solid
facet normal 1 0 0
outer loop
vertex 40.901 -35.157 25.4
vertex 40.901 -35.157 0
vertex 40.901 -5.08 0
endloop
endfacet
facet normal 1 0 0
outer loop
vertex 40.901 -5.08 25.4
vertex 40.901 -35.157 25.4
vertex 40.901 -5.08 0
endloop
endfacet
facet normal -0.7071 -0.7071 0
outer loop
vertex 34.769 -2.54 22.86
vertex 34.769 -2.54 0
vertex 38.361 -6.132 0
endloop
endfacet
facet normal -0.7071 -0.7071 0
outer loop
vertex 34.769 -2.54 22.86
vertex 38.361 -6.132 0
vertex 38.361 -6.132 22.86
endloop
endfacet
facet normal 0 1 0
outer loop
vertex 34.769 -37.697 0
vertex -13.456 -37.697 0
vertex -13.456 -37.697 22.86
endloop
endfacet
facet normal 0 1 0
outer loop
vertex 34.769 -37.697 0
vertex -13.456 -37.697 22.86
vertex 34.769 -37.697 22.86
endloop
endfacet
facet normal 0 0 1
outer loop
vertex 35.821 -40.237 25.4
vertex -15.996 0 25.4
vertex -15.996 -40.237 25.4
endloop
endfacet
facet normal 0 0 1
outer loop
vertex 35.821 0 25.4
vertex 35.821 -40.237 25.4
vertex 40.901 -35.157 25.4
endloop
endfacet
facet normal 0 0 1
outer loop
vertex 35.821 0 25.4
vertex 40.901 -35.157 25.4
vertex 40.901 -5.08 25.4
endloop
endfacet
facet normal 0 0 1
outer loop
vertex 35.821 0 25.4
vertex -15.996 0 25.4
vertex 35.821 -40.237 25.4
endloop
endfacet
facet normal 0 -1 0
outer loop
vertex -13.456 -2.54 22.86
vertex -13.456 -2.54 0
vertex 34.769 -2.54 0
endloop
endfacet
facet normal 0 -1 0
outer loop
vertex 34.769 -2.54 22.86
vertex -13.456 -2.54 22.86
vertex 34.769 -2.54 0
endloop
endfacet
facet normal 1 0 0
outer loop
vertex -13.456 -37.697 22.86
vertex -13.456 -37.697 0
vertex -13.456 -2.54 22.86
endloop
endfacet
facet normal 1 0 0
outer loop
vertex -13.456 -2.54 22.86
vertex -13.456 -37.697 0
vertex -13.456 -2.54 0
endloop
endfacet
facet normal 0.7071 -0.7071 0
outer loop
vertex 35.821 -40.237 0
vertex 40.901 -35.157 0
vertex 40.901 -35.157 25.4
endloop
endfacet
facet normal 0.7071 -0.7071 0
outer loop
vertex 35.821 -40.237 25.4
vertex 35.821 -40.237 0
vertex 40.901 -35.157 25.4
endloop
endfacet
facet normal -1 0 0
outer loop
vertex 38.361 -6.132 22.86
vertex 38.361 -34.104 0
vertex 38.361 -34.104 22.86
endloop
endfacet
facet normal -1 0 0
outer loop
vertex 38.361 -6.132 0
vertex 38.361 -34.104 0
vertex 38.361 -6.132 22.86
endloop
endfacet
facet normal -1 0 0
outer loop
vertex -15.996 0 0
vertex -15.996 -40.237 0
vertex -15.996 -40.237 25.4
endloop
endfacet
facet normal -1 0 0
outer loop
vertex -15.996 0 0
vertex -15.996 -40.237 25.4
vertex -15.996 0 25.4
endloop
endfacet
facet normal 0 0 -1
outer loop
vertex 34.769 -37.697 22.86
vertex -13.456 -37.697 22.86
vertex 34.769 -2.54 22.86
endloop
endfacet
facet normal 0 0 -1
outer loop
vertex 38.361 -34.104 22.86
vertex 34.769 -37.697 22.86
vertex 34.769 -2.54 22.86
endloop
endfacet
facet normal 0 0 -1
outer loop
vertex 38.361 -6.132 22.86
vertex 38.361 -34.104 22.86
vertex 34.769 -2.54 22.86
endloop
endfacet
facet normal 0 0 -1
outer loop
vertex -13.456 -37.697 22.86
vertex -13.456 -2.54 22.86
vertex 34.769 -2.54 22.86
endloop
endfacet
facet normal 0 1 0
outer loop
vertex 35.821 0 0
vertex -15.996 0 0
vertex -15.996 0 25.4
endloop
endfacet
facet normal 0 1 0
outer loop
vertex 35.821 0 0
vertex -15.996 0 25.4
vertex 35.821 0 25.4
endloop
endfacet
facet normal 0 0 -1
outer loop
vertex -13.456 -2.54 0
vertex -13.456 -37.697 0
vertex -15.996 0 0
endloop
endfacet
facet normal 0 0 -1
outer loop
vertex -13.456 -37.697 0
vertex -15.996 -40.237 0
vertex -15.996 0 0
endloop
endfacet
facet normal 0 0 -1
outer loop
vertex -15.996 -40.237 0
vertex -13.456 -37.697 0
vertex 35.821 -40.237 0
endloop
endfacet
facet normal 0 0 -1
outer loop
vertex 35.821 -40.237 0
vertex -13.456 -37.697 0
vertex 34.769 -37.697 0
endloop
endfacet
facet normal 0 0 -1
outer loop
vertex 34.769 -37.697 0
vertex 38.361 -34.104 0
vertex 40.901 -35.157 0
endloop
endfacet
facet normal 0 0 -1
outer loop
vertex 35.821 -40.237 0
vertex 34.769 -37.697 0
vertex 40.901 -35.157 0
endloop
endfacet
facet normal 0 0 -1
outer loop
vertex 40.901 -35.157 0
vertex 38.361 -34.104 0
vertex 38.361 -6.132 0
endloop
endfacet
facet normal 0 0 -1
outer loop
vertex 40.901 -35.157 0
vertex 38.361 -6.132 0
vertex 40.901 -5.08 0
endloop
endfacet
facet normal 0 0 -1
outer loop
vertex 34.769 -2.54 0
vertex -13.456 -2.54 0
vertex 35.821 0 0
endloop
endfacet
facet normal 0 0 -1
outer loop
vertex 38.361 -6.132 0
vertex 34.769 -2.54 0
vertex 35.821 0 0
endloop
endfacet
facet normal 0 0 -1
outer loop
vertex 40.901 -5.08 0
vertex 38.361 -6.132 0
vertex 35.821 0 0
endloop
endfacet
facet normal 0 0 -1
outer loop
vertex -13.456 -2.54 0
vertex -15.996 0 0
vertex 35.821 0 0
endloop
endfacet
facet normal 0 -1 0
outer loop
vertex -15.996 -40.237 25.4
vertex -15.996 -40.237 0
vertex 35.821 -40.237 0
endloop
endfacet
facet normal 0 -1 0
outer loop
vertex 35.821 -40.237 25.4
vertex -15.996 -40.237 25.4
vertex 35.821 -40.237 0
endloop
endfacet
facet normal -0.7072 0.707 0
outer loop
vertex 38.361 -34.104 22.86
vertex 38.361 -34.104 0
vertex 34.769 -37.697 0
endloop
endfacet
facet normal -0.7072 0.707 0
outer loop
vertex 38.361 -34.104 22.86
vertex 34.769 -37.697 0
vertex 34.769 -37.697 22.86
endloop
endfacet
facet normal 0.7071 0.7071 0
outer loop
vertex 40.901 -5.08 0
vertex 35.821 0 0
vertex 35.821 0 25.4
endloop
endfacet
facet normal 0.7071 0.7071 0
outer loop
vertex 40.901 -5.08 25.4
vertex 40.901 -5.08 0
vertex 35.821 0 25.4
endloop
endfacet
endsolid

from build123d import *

# Parameters (mm, degrees)
F0_W     = 56.8971335888
F0_H     = 40.2365922928
F1_DEPTH = 25.4
F2_SIZE  = 5.08
F5_T     = -2.54


# Not quite as in the source:
# - the program builds the solid bodies; features that only make, move or delete a surface that nothing else refers to are left out


with BuildPart() as f1:
    # F0 (on Top) → F1 (new body)
    with BuildSketch(Plane.XY):
        with Locations((12.4524980783, -20.1182961464)):
            Rectangle(F0_W, F0_H)
    extrude(amount=F1_DEPTH)

    # F2
    f2_edges = [f1.edges().sort_by_distance(p)[0] for p in [
        (40.901065, -40.236592, 12.7),
        (40.901065, 0, 12.7),
    ]]
    chamfer(f2_edges, length=F2_SIZE)

    # F5
    f5_openings = [f1.faces().sort_by_distance(p)[0] for p in [
        (12.147464, -20.118296, 0),
    ]]
    offset(amount=F5_T, openings=f5_openings)


solid = f1.part
